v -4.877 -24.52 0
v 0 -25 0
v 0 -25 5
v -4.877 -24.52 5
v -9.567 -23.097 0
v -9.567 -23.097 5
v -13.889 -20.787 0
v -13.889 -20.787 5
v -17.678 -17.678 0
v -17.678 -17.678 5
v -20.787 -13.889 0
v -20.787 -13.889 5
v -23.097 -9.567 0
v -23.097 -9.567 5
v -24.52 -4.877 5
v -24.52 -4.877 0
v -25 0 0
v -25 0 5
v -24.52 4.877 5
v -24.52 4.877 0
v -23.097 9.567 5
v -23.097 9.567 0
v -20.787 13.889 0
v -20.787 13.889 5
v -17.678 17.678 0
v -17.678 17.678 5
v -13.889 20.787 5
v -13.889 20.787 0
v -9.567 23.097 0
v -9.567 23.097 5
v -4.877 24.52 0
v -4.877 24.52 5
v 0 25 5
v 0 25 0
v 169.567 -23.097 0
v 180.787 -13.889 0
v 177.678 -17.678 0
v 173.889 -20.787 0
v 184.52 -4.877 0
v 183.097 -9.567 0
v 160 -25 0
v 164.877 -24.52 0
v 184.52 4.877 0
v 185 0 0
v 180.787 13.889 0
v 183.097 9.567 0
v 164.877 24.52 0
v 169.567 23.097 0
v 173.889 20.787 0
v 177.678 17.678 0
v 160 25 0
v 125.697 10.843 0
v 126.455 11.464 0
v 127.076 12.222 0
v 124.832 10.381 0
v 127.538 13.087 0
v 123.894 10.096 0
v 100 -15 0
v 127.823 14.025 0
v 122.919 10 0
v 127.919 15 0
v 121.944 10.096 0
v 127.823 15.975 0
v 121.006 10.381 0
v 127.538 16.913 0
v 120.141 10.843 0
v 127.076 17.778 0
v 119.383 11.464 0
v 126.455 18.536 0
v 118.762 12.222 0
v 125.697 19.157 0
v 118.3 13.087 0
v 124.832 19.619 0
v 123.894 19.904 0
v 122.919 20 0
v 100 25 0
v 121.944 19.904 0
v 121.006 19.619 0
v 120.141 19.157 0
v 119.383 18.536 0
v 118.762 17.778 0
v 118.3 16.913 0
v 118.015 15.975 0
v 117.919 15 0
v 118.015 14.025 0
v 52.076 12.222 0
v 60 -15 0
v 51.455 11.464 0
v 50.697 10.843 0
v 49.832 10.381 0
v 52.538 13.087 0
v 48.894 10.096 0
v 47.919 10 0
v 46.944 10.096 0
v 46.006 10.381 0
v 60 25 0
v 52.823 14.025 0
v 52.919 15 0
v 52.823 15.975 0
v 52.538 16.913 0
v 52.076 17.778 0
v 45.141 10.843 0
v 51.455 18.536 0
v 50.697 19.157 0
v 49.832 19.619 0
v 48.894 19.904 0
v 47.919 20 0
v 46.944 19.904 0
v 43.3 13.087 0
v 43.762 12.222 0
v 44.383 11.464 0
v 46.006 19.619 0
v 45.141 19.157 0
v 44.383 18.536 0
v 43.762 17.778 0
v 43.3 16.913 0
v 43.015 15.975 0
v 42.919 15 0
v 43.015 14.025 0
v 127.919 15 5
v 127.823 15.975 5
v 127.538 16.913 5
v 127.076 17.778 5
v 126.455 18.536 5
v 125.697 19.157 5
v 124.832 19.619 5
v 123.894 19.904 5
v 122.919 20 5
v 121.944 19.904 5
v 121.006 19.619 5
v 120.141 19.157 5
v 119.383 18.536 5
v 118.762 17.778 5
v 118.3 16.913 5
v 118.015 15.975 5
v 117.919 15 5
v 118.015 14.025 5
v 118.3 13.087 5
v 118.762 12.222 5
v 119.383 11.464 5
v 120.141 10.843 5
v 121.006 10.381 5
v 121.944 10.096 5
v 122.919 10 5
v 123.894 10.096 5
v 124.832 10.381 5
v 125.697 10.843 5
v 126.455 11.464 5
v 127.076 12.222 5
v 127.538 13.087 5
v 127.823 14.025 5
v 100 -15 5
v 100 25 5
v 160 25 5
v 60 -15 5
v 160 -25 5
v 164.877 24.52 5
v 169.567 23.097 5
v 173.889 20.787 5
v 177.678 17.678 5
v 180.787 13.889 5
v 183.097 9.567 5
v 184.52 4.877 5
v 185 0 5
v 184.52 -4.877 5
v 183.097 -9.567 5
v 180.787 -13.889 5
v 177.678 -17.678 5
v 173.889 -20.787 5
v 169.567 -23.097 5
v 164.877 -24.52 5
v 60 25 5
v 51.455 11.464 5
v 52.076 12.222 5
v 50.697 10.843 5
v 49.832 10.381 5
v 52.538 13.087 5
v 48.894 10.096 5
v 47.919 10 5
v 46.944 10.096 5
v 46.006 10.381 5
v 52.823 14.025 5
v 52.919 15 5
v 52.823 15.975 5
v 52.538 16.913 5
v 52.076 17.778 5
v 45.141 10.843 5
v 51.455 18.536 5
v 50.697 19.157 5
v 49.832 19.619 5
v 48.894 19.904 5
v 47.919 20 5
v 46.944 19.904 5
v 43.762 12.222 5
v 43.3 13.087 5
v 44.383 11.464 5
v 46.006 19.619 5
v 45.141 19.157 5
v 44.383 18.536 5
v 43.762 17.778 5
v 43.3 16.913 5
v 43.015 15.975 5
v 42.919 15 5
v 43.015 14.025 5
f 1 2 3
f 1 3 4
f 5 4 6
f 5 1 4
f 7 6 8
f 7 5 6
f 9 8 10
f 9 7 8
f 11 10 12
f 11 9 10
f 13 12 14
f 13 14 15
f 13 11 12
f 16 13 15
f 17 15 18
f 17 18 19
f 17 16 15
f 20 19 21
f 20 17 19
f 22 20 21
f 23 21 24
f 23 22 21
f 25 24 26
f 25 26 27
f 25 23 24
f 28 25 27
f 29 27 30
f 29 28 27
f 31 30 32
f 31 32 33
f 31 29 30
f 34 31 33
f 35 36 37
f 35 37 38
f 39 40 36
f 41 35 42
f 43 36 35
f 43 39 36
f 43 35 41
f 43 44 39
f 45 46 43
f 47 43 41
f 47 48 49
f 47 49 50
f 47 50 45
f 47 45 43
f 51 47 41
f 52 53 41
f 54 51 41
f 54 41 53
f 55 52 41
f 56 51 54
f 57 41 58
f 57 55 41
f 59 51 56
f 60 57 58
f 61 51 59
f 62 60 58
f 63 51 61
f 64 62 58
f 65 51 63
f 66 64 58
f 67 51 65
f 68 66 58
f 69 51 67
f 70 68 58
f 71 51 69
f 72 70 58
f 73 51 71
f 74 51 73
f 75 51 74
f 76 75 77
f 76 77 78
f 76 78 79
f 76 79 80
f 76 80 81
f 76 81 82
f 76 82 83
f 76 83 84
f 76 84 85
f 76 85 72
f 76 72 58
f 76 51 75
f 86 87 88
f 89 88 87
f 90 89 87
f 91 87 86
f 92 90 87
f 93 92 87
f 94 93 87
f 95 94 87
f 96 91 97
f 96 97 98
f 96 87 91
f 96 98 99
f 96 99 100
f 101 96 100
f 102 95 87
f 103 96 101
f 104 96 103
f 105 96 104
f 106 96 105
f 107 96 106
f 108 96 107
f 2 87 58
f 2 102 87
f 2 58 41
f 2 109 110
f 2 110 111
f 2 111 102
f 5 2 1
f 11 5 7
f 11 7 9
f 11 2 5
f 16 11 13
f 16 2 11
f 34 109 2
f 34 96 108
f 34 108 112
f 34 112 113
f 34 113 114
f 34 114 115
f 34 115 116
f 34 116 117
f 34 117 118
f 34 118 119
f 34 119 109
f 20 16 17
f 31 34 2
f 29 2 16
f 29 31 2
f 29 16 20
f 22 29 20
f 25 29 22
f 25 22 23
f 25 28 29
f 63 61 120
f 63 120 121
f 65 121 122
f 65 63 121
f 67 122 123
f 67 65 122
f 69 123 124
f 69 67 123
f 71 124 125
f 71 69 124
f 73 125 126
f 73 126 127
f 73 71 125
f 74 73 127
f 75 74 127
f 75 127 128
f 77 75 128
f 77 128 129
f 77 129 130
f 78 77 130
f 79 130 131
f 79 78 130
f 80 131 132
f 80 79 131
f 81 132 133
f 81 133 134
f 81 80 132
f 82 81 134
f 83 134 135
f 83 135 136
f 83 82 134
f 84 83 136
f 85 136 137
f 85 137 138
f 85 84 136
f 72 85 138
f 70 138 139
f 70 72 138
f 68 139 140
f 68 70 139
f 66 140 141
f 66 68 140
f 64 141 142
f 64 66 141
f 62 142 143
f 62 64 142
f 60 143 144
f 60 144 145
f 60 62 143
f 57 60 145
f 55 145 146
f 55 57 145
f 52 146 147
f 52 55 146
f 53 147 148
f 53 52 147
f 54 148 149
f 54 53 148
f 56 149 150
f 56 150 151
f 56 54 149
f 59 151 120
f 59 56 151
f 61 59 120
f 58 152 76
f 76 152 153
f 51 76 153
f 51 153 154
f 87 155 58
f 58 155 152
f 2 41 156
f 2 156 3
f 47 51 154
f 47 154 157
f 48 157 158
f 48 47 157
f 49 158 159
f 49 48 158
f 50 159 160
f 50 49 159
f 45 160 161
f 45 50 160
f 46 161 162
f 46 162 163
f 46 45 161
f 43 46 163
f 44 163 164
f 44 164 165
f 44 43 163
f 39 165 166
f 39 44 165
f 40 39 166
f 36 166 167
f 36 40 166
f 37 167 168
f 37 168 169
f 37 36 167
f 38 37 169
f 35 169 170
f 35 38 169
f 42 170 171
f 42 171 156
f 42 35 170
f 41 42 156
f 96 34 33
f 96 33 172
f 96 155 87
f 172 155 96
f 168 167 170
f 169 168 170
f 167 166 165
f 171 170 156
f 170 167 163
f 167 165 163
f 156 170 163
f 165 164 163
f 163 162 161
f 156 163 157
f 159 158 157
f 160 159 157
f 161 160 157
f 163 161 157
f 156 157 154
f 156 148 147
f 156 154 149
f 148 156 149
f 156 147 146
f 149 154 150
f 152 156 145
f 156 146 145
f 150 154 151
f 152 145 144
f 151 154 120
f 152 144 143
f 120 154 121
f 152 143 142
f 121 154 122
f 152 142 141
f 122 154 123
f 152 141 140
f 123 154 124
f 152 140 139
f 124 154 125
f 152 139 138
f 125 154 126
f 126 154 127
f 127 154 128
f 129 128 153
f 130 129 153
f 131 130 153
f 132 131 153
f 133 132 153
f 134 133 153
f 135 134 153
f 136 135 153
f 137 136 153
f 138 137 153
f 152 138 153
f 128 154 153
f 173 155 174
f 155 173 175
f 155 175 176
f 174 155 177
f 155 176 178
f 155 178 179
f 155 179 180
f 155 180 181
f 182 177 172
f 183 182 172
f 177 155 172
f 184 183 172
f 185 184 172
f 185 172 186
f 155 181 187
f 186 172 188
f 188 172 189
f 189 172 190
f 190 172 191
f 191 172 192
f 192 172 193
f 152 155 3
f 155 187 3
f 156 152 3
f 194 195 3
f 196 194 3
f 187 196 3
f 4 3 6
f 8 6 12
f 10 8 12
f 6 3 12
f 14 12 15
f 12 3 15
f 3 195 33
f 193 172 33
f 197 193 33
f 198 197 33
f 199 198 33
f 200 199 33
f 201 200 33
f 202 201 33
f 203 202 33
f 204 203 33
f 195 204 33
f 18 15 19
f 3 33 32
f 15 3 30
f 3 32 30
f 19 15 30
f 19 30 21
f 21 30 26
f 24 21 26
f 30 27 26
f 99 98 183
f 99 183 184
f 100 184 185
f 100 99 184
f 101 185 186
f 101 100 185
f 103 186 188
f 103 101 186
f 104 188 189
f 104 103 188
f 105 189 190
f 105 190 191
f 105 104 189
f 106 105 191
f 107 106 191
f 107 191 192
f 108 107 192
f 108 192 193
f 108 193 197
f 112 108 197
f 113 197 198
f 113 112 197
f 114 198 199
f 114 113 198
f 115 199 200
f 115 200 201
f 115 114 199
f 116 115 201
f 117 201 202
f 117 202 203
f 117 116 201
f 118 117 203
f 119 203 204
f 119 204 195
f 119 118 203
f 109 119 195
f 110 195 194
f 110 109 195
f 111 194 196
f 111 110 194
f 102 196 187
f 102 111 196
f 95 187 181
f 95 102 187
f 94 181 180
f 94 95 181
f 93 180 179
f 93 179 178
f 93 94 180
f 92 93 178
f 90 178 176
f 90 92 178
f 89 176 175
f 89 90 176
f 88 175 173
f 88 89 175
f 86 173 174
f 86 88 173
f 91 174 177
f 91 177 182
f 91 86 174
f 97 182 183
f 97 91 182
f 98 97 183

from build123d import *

# Parameters (mm, degrees)
ESQUISSE1_R             = 5
BOSS_EXTRU_1_DEPTH      = 5
ESQUISSE2_W             = 40
ESQUISSE2_H             = 40
ENL_V_MAT_EXTRU_1_DEPTH = 5


with BuildPart() as part:
    # Esquisse1 → Boss.-Extru.1 (new body)
    with BuildSketch(Plane.XY):
        with BuildLine():
            Line((0, 25), (160, 25))
            ThreePointArc((160, 25), (185, 0), (160, -25))
            Line((160, -25), (0, -25))
            ThreePointArc((0, -25), (-25, 0), (0, 25))
        make_face()
        with Locations((122.919007565, 15)):
            Circle(ESQUISSE1_R, mode=Mode.SUBTRACT)
        with Locations((47.919007565, 15)):
            Circle(ESQUISSE1_R, mode=Mode.SUBTRACT)
    extrude(amount=BOSS_EXTRU_1_DEPTH)

    # Esquisse2 → Enlèv. mat.-Extru.1 (cut)
    with BuildSketch(Plane.XY.offset(5)):
        with Locations((80, 5)):
            Rectangle(ESQUISSE2_W, ESQUISSE2_H)
    extrude(amount=-ENL_V_MAT_EXTRU_1_DEPTH, mode=Mode.SUBTRACT)


solid = part.part
